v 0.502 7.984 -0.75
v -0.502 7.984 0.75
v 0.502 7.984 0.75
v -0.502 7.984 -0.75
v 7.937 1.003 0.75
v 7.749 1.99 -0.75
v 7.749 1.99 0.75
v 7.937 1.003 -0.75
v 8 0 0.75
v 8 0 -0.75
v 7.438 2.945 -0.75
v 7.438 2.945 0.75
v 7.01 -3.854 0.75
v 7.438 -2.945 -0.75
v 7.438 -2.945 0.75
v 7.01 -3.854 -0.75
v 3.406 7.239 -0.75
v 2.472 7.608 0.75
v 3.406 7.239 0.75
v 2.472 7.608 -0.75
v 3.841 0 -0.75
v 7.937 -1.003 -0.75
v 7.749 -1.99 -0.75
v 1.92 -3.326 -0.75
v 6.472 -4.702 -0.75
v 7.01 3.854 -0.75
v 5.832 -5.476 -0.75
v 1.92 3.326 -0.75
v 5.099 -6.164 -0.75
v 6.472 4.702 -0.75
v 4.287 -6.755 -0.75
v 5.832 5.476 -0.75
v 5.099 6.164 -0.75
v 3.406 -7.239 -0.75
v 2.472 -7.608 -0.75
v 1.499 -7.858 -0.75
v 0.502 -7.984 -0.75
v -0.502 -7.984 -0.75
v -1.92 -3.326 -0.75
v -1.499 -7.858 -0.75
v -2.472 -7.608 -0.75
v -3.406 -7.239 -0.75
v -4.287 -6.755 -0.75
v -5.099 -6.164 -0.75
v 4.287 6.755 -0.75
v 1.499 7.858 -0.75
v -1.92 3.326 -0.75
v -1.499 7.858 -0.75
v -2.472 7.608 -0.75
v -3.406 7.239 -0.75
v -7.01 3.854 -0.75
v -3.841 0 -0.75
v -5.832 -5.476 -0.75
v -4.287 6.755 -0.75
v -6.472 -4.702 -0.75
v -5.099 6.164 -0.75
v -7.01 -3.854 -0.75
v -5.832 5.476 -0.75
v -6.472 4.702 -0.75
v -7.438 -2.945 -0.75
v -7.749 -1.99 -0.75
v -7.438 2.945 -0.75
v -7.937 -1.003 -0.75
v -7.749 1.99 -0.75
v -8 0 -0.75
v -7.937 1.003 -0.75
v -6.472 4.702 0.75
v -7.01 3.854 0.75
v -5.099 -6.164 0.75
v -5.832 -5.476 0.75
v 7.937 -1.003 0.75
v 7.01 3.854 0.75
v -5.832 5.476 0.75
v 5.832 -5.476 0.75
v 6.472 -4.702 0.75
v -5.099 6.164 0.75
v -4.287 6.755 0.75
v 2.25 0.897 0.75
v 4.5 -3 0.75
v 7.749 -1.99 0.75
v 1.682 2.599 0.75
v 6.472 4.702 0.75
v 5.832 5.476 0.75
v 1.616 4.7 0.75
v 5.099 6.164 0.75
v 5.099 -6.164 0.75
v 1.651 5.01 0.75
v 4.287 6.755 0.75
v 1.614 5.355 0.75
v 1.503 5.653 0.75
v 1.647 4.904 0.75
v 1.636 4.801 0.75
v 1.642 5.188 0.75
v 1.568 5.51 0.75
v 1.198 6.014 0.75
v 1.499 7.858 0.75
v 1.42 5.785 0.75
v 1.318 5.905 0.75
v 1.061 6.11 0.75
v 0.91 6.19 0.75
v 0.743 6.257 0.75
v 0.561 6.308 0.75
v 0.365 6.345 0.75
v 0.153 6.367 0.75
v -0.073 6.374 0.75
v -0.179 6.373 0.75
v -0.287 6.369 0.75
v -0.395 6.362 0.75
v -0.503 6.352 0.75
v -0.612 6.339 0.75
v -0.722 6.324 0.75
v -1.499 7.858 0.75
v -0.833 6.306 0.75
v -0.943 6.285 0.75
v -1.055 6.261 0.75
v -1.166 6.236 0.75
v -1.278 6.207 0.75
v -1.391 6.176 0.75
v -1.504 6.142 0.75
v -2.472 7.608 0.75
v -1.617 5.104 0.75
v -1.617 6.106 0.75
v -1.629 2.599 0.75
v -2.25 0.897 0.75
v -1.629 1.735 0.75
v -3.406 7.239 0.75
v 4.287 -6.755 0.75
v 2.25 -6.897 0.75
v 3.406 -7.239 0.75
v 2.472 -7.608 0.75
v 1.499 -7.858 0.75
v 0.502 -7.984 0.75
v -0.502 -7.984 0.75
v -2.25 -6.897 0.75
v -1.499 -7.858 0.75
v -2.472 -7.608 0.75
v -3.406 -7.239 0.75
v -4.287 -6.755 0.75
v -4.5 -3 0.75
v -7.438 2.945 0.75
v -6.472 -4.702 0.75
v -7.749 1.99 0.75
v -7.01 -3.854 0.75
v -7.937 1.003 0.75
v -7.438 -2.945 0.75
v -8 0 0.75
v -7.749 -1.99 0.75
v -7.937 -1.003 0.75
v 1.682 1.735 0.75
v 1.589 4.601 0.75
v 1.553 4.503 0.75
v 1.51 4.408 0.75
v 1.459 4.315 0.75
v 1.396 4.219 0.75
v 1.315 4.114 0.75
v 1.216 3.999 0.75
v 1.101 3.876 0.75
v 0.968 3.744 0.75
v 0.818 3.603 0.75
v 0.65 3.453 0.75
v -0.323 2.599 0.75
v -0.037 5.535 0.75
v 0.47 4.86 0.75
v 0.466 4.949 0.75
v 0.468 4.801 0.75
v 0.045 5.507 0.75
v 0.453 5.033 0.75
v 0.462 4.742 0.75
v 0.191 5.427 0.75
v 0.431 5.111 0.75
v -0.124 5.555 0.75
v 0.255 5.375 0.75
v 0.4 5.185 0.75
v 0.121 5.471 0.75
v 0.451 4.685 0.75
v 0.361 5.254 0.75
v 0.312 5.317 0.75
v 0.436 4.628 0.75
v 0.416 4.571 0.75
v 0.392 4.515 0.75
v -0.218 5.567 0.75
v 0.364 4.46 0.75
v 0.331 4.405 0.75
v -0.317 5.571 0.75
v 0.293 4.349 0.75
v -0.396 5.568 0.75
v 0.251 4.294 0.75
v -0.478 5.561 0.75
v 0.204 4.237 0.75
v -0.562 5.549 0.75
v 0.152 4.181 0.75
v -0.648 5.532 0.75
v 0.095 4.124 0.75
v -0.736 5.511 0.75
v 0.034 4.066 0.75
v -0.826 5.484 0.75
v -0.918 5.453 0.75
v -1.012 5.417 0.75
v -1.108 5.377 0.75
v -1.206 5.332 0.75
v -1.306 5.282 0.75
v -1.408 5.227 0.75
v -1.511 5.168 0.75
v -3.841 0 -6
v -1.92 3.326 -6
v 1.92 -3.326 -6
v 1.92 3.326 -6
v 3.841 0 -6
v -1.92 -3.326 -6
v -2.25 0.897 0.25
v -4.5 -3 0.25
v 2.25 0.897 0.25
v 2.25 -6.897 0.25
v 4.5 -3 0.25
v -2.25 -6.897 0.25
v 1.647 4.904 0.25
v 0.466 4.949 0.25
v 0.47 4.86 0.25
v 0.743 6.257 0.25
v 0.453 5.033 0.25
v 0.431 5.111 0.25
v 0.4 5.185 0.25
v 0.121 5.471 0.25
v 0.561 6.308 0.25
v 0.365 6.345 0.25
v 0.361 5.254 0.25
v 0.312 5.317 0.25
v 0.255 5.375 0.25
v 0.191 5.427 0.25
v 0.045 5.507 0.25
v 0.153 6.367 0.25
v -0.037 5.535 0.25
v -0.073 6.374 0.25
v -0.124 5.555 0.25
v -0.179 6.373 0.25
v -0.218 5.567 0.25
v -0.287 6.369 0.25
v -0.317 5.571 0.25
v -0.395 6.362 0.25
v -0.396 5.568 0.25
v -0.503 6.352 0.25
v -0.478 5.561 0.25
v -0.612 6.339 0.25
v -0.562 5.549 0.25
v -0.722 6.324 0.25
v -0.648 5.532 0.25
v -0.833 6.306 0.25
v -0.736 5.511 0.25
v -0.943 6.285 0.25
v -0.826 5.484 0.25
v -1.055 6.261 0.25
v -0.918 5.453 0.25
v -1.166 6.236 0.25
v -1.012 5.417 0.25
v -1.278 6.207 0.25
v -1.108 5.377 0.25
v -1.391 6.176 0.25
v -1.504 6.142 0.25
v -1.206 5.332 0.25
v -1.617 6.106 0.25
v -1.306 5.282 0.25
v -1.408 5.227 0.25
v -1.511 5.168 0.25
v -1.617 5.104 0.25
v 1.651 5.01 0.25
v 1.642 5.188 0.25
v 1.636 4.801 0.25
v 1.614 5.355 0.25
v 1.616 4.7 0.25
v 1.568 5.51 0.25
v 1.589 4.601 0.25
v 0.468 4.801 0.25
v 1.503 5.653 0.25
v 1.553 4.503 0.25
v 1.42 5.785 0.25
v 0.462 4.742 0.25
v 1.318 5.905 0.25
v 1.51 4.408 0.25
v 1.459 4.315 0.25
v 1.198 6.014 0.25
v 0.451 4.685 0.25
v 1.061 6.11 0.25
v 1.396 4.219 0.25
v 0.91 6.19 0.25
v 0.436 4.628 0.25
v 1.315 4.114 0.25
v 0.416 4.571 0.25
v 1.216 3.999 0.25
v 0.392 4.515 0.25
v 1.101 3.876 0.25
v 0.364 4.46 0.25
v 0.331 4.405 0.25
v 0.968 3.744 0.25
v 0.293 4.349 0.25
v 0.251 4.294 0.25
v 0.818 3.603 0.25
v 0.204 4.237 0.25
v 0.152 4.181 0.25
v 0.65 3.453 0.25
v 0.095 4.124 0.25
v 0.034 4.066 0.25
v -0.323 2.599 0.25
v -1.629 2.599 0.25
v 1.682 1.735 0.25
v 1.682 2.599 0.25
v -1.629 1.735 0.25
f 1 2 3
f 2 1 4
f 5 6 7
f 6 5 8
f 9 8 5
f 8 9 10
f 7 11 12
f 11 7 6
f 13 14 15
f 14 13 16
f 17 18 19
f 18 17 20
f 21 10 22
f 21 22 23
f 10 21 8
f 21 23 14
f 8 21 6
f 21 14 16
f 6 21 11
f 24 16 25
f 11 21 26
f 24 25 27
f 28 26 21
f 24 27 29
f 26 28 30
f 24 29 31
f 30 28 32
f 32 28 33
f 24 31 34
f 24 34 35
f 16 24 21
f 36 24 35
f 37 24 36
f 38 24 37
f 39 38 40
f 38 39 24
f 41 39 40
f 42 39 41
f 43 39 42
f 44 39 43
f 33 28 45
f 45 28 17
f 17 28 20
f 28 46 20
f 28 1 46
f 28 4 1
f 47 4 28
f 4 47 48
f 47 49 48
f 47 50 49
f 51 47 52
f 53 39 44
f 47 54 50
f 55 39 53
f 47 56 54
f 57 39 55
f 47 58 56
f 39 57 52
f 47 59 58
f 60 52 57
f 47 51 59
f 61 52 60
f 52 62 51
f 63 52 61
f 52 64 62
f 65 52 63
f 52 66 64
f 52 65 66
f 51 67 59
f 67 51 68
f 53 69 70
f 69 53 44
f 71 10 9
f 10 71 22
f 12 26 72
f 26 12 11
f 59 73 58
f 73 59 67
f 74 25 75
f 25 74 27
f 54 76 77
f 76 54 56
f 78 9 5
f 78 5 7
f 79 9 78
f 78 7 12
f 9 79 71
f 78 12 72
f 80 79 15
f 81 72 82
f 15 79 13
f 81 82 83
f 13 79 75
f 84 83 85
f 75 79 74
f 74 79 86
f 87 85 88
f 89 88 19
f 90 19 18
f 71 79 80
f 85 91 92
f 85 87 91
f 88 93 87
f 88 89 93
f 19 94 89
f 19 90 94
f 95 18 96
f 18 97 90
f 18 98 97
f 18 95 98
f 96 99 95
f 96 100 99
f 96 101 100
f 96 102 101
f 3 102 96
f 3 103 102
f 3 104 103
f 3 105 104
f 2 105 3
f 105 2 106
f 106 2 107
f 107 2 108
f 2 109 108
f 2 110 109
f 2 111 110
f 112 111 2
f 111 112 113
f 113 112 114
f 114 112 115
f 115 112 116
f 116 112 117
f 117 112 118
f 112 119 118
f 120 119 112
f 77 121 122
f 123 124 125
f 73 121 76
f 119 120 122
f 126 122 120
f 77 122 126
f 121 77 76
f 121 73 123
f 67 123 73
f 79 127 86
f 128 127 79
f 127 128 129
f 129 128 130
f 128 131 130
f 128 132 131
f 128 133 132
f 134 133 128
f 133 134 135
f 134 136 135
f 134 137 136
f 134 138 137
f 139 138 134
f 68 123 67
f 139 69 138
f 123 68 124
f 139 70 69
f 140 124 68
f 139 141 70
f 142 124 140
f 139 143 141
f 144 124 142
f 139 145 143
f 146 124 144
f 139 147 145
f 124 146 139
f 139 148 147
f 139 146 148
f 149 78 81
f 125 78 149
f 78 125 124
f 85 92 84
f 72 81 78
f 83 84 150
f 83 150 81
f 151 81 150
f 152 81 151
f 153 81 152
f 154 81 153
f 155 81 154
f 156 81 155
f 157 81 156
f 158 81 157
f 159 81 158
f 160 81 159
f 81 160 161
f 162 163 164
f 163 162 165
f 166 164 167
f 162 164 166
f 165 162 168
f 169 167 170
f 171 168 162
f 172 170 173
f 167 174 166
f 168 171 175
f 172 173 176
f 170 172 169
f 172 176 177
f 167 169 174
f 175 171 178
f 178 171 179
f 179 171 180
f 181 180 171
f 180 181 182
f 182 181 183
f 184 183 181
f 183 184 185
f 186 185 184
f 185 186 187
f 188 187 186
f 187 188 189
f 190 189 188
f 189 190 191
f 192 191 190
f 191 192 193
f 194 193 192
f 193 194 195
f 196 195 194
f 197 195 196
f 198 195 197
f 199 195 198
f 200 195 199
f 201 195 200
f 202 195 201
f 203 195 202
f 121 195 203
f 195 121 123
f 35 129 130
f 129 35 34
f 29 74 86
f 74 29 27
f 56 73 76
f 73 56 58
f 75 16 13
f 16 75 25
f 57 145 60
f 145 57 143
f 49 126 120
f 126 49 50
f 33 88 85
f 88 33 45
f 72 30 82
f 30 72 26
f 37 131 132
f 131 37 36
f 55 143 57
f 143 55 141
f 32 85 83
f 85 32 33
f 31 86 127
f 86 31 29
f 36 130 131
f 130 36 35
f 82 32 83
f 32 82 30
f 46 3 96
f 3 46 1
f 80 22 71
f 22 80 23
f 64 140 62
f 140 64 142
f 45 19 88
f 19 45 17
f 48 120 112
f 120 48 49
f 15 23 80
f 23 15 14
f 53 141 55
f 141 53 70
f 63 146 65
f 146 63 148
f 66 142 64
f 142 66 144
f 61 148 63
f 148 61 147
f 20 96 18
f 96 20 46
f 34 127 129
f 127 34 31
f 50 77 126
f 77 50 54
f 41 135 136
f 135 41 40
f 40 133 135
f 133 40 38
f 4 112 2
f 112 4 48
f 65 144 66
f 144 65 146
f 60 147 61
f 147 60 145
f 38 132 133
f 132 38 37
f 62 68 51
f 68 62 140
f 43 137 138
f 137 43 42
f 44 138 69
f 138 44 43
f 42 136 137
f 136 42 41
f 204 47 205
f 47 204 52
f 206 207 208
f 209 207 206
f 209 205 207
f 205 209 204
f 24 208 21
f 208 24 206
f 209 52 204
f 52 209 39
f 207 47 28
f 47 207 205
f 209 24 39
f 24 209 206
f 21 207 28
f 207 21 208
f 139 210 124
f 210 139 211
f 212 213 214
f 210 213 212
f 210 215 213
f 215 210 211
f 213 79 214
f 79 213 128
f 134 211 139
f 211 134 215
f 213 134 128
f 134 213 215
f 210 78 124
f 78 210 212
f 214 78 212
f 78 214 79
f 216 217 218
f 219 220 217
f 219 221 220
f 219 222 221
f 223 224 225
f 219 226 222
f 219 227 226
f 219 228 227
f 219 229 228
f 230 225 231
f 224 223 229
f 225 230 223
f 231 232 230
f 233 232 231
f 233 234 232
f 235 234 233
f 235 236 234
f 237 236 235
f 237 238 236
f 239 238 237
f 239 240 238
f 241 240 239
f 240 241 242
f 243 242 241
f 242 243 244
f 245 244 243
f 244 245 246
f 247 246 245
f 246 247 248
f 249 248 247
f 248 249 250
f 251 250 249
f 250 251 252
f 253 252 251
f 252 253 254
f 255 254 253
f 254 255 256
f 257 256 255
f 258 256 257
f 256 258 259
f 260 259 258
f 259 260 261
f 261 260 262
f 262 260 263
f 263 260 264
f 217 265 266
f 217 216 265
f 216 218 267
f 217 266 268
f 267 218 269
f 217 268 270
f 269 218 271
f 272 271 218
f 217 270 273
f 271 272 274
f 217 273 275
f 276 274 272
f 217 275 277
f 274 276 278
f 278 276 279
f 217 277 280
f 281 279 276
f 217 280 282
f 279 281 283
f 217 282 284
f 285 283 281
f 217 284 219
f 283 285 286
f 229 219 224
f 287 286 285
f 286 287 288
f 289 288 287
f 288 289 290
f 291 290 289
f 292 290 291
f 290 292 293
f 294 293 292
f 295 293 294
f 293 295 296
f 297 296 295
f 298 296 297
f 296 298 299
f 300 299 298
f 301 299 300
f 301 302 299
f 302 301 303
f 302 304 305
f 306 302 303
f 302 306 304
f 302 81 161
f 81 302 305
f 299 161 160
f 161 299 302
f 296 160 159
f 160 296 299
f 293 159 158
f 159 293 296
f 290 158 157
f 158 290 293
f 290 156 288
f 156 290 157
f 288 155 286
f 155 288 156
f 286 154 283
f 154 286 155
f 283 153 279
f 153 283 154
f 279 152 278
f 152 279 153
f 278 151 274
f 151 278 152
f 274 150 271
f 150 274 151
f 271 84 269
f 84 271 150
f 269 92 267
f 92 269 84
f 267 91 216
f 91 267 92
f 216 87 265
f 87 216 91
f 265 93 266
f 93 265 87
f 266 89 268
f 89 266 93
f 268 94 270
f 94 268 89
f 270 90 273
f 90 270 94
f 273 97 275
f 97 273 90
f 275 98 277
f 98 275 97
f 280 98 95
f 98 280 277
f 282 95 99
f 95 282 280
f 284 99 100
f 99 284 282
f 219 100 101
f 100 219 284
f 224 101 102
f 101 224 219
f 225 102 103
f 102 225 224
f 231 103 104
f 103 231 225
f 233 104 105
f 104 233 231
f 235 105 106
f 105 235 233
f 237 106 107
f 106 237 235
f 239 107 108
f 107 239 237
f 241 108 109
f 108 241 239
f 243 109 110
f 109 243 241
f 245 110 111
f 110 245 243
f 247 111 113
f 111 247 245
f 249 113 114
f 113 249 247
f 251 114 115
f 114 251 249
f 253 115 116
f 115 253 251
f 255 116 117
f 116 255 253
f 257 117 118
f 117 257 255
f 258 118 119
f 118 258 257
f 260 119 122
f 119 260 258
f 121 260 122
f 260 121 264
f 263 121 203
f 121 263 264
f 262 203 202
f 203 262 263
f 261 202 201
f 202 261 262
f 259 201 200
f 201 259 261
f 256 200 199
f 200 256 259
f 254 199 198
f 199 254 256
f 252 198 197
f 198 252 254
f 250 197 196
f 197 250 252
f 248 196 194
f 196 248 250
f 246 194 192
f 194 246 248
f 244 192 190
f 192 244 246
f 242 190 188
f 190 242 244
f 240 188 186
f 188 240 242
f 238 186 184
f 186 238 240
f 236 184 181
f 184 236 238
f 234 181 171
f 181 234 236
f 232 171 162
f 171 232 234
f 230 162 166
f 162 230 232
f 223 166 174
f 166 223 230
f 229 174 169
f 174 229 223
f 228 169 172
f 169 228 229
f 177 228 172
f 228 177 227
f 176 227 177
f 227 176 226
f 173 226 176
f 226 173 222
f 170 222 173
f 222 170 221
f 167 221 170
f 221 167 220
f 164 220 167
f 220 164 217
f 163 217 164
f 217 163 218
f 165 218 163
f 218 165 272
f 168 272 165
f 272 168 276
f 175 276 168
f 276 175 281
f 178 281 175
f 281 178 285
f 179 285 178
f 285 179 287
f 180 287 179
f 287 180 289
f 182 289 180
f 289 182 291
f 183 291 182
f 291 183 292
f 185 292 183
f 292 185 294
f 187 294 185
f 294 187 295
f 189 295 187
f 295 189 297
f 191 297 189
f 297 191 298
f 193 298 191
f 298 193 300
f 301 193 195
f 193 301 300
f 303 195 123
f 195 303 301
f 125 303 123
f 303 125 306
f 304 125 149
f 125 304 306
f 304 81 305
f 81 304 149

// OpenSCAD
$fn = 50;


difference() {
	union() {
		translate(v = [0, 0, -0.7500000000]) {
			cylinder(h = 1.5000000000, r = 8.0000000000);
		}
		translate(v = [0, 0, -6]) {
			linear_extrude(height = 6) {
				polygon(points = [[3.8408550000, 0.0000000000], [1.9204275000, 3.3262780023], [-1.9204275000, 3.3262780023], [-3.8408550000, 0.0000000000], [-1.9204275000, -3.3262780023], [1.9204275000, -3.3262780023]]);
			}
		}
	}
	union() {
		translate(v = [0, -3, 0.2500000000]) {
			#linear_extrude(height = 0.5000000000) {
				polygon(points = [[4.5000000000, 0.0000000000], [2.2500000000, 3.8971143170], [-2.2500000000, 3.8971143170], [-4.5000000000, 0.0000000000], [-2.2500000000, -3.8971143170], [2.2500000000, -3.8971143170]]);
			}
		}
		#translate(v = [0, 4, 0.2500000000]) {
			linear_extrude(height = 0.5000000000) {
				text(font = "SegoiUI:Bold", halign = "center", size = 4.5000000000, text = "2", valign = "center");
			}
		}
	}
}
